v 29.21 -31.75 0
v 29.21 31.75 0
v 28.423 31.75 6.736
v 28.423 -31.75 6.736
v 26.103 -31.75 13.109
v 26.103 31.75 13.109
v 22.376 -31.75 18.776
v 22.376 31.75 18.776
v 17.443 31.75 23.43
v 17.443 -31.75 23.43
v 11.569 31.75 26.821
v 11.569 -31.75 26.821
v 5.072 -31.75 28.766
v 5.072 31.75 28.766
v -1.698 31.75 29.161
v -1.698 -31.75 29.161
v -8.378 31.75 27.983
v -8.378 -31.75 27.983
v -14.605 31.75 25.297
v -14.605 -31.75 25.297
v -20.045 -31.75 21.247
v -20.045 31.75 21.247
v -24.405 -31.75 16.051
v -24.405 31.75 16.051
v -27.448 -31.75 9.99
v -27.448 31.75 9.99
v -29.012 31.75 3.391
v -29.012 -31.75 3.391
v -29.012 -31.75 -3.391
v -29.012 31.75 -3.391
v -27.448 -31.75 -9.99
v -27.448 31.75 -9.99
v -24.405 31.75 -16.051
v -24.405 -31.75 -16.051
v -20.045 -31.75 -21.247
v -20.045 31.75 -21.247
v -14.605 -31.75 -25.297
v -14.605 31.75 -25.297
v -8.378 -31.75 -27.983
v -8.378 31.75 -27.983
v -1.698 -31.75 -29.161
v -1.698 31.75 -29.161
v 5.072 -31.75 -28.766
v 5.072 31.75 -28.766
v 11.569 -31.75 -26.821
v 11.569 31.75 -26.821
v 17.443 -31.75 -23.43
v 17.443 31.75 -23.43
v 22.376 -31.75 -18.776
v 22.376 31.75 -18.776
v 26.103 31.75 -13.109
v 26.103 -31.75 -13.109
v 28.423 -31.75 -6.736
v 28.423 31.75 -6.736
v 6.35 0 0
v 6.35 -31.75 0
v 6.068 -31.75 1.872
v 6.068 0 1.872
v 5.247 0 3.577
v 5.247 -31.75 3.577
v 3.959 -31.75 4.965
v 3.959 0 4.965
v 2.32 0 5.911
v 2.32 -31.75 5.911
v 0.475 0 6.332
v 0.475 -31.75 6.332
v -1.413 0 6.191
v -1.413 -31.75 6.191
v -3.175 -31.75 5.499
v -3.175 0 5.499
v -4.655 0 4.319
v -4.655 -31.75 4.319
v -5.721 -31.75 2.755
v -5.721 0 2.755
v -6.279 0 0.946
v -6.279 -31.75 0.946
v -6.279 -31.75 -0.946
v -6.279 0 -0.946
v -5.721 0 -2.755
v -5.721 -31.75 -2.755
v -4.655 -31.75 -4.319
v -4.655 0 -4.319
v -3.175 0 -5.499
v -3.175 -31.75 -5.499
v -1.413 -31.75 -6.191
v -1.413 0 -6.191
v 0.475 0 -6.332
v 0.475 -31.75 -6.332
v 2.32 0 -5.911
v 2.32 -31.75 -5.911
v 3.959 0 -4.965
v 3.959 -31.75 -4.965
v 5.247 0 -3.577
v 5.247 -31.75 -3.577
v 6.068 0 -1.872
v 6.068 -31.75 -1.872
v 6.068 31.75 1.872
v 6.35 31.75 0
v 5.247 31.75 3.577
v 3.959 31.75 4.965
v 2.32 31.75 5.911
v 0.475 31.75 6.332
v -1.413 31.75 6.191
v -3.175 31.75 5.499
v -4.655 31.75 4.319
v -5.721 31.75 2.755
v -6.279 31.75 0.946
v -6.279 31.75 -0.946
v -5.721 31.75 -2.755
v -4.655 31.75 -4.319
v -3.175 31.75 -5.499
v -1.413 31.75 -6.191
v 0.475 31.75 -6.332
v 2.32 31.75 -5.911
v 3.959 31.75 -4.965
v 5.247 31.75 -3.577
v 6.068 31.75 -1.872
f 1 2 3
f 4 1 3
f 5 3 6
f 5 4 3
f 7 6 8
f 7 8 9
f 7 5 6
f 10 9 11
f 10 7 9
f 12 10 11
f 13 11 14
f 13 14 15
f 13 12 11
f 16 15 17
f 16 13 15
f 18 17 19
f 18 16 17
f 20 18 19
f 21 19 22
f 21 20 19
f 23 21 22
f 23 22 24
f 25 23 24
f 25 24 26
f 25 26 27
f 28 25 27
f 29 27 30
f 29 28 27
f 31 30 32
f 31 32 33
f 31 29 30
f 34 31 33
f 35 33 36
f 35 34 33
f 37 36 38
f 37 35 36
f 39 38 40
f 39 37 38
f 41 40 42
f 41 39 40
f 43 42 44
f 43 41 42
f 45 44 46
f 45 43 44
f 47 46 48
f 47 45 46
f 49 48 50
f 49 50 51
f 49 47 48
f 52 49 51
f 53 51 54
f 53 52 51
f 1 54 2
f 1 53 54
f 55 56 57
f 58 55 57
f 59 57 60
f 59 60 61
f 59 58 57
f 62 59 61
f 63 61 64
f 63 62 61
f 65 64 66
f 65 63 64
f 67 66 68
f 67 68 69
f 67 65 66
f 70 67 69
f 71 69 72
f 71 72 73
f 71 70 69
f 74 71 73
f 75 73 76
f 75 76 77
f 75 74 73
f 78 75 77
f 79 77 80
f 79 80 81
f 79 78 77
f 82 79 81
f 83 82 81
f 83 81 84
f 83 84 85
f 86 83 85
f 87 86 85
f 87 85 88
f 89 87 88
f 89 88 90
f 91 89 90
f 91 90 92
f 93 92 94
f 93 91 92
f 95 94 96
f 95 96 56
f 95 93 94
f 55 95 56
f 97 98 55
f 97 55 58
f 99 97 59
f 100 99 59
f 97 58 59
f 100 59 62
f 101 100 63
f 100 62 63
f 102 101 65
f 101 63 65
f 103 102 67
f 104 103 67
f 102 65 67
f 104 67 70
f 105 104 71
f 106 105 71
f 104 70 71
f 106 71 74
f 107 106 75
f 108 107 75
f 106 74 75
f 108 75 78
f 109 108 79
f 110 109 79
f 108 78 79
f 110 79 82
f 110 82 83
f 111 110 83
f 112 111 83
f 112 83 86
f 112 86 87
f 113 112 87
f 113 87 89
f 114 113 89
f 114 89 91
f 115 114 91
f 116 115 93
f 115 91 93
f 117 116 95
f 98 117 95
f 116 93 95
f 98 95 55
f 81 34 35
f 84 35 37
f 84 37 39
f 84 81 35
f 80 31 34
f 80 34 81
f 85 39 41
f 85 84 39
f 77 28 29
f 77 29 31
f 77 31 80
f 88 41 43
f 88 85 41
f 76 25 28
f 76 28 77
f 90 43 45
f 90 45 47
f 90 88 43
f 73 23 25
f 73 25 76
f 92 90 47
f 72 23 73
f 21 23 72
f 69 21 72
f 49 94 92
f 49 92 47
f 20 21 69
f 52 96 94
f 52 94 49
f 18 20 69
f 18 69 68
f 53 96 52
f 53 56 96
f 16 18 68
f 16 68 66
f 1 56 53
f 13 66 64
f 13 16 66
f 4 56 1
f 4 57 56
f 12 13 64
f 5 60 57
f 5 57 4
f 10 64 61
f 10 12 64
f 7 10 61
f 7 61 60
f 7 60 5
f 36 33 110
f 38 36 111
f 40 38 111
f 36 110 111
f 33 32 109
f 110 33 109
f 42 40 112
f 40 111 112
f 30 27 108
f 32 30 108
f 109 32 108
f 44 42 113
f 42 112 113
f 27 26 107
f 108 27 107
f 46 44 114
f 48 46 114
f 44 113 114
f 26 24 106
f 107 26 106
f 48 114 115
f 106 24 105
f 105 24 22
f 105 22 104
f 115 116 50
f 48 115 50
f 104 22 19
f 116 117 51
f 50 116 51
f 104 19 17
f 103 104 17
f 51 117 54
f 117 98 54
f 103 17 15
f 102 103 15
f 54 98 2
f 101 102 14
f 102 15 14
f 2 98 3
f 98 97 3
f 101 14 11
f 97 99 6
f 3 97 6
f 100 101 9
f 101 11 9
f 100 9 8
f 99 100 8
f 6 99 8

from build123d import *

# Parameters (mm, degrees)
F0_R     = 29.21
F1_DEPTH = 31.75
F0_R_2   = 6.35
F2_DEPTH = 31.75
F3_DEPTH = 31.75


with BuildPart() as f1:
    # F0 (on Front) → F1 (new body)
    with BuildSketch(Plane.XZ):
        Circle(F0_R)
        with BuildLine():
            ThreePointArc((21.5331844423, 10.8893924428), (23.4718197057, 5.5973725715), (24.13, 0))
            ThreePointArc((24.13, 0), (17.4832992726, -16.6310296298), (1.2049153298, -24.0998979053))
            ThreePointArc((1.2049153298, -24.0998979053), (-0.0651750036, -24.1299119812), (-1.3350846702, -24.0930373536))
            ThreePointArc((-1.3350846702, -24.0930373536), (-21.1740501638, -11.5722296754), (-20.9990868902, 11.8867678441))
            ThreePointArc((-20.9990868902, 11.8867678441), (-20.3436941865, 12.9765560472), (-19.6317982914, 14.030302771))
            ThreePointArc((-19.6317982914, 14.030302771), (0.5669275044, 24.1233391802), (20.2692187002, 13.0925808489))
            ThreePointArc((20.2692187002, 13.0925808489), (20.9302111052, 12.0076293701), (21.5331844423, 10.8893924428))
        make_face(mode=Mode.SUBTRACT)
    extrude(amount=F1_DEPTH)



with BuildPart() as f2:
    # F0 (on Front) → F2 (new body)
    with BuildSketch(Plane.XZ):
        with BuildLine():
            ThreePointArc((8.89, 0), (8.7360592676, 1.6472305465), (8.2795683975, 3.2374136516))
            ThreePointArc((8.2795683975, 3.2374136516), (7.7321419682, 4.3870355119), (7.026094307, 5.4466594156))
            ThreePointArc((7.026094307, 5.4466594156), (0.5769925697, 8.8712558059), (-6.2613755065, 6.310885577))
            ThreePointArc((-6.2613755065, 6.310885577), (-7.1044258576, 5.3440839471), (-7.7995628745, 4.2660191005))
            ThreePointArc((-7.7995628745, 4.2660191005), (-7.9668054392, -3.9448841673), (-1.3350846702, -8.7891779435))
            ThreePointArc((-1.3350846702, -8.7891779435), (-0.0657591783, -8.8897567869), (1.2049153298, -8.8079667942))
            ThreePointArc((1.2049153298, -8.8079667942), (6.6986490161, -5.8446729044), (8.89, 0))
        make_face()
        Circle(F0_R_2, mode=Mode.SUBTRACT)
    extrude(amount=F2_DEPTH)


with BuildPart() as f1_1:
    add(f1.part)

    add(f2.part)  # F3 merges F2
    # F0 (on Front) → F3 (join)
    with BuildSketch(Plane.XZ):
        with BuildLine():
            Line((-6.2613755065, 6.310885577), (-19.6317982914, 14.030302771))
            ThreePointArc((-19.6317982914, 14.030302771), (-20.3436941865, 12.9765560472), (-20.9990868902, 11.8867678441))
            Line((-20.9990868902, 11.8867678441), (-7.7995628745, 4.2660191005))
            ThreePointArc((-7.7995628745, 4.2660191005), (-7.1044258576, 5.3440839471), (-6.2613755065, 6.310885577))
        make_face()
        with BuildLine():
            ThreePointArc((-1.3350846702, -24.0930373536), (-0.0651750036, -24.1299119812), (1.2049153298, -24.0998979053))
            Line((1.2049153298, -24.0998979053), (1.2049153298, -8.8079667942))
            ThreePointArc((1.2049153298, -8.8079667942), (-0.0657591783, -8.8897567869), (-1.3350846702, -8.7891779435))
            Line((-1.3350846702, -8.7891779435), (-1.3350846702, -24.0930373536))
        make_face()
        with BuildLine():
            Line((8.2795683975, 3.2374136516), (21.5331844423, 10.8893924428))
            ThreePointArc((21.5331844423, 10.8893924428), (20.9302111052, 12.0076293701), (20.2692187002, 13.0925808489))
            Line((20.2692187002, 13.0925808489), (7.026094307, 5.4466594156))
            ThreePointArc((7.026094307, 5.4466594156), (7.7321419682, 4.3870355119), (8.2795683975, 3.2374136516))
        make_face()
        with BuildLine():
            ThreePointArc((-20.9990868902, 11.8867678441), (-21.1740501638, -11.5722296754), (-1.3350846702, -24.0930373536))
            Line((-1.3350846702, -24.0930373536), (-1.3350846702, -8.7891779435))
            ThreePointArc((-1.3350846702, -8.7891779435), (-7.9668054392, -3.9448841673), (-7.7995628745, 4.2660191005))
            Line((-7.7995628745, 4.2660191005), (-20.9990868902, 11.8867678441))
        make_face()
        with BuildLine():
            Line((7.026094307, 5.4466594156), (20.2692187002, 13.0925808489))
            ThreePointArc((20.2692187002, 13.0925808489), (0.5669275044, 24.1233391802), (-19.6317982914, 14.030302771))
            Line((-19.6317982914, 14.030302771), (-6.2613755065, 6.310885577))
            ThreePointArc((-6.2613755065, 6.310885577), (0.5769925697, 8.8712558059), (7.026094307, 5.4466594156))
        make_face()
        with BuildLine():
            ThreePointArc((1.2049153298, -24.0998979053), (17.4832992726, -16.6310296298), (24.13, 0))
            ThreePointArc((24.13, 0), (23.4718197057, 5.5973725715), (21.5331844423, 10.8893924428))
            Line((21.5331844423, 10.8893924428), (8.2795683975, 3.2374136516))
            ThreePointArc((8.2795683975, 3.2374136516), (8.7360592676, 1.6472305465), (8.89, 0))
            ThreePointArc((8.89, 0), (6.6986490161, -5.8446729044), (1.2049153298, -8.8079667942))
            Line((1.2049153298, -8.8079667942), (1.2049153298, -24.0998979053))
        make_face()
    extrude(amount=F3_DEPTH)

    # F4: F1 across plane


with BuildPart() as f1_2:
    add(f1_1.part)
    add(f1_1.part.mirror(Plane.XZ))


solid = f1_2.part
